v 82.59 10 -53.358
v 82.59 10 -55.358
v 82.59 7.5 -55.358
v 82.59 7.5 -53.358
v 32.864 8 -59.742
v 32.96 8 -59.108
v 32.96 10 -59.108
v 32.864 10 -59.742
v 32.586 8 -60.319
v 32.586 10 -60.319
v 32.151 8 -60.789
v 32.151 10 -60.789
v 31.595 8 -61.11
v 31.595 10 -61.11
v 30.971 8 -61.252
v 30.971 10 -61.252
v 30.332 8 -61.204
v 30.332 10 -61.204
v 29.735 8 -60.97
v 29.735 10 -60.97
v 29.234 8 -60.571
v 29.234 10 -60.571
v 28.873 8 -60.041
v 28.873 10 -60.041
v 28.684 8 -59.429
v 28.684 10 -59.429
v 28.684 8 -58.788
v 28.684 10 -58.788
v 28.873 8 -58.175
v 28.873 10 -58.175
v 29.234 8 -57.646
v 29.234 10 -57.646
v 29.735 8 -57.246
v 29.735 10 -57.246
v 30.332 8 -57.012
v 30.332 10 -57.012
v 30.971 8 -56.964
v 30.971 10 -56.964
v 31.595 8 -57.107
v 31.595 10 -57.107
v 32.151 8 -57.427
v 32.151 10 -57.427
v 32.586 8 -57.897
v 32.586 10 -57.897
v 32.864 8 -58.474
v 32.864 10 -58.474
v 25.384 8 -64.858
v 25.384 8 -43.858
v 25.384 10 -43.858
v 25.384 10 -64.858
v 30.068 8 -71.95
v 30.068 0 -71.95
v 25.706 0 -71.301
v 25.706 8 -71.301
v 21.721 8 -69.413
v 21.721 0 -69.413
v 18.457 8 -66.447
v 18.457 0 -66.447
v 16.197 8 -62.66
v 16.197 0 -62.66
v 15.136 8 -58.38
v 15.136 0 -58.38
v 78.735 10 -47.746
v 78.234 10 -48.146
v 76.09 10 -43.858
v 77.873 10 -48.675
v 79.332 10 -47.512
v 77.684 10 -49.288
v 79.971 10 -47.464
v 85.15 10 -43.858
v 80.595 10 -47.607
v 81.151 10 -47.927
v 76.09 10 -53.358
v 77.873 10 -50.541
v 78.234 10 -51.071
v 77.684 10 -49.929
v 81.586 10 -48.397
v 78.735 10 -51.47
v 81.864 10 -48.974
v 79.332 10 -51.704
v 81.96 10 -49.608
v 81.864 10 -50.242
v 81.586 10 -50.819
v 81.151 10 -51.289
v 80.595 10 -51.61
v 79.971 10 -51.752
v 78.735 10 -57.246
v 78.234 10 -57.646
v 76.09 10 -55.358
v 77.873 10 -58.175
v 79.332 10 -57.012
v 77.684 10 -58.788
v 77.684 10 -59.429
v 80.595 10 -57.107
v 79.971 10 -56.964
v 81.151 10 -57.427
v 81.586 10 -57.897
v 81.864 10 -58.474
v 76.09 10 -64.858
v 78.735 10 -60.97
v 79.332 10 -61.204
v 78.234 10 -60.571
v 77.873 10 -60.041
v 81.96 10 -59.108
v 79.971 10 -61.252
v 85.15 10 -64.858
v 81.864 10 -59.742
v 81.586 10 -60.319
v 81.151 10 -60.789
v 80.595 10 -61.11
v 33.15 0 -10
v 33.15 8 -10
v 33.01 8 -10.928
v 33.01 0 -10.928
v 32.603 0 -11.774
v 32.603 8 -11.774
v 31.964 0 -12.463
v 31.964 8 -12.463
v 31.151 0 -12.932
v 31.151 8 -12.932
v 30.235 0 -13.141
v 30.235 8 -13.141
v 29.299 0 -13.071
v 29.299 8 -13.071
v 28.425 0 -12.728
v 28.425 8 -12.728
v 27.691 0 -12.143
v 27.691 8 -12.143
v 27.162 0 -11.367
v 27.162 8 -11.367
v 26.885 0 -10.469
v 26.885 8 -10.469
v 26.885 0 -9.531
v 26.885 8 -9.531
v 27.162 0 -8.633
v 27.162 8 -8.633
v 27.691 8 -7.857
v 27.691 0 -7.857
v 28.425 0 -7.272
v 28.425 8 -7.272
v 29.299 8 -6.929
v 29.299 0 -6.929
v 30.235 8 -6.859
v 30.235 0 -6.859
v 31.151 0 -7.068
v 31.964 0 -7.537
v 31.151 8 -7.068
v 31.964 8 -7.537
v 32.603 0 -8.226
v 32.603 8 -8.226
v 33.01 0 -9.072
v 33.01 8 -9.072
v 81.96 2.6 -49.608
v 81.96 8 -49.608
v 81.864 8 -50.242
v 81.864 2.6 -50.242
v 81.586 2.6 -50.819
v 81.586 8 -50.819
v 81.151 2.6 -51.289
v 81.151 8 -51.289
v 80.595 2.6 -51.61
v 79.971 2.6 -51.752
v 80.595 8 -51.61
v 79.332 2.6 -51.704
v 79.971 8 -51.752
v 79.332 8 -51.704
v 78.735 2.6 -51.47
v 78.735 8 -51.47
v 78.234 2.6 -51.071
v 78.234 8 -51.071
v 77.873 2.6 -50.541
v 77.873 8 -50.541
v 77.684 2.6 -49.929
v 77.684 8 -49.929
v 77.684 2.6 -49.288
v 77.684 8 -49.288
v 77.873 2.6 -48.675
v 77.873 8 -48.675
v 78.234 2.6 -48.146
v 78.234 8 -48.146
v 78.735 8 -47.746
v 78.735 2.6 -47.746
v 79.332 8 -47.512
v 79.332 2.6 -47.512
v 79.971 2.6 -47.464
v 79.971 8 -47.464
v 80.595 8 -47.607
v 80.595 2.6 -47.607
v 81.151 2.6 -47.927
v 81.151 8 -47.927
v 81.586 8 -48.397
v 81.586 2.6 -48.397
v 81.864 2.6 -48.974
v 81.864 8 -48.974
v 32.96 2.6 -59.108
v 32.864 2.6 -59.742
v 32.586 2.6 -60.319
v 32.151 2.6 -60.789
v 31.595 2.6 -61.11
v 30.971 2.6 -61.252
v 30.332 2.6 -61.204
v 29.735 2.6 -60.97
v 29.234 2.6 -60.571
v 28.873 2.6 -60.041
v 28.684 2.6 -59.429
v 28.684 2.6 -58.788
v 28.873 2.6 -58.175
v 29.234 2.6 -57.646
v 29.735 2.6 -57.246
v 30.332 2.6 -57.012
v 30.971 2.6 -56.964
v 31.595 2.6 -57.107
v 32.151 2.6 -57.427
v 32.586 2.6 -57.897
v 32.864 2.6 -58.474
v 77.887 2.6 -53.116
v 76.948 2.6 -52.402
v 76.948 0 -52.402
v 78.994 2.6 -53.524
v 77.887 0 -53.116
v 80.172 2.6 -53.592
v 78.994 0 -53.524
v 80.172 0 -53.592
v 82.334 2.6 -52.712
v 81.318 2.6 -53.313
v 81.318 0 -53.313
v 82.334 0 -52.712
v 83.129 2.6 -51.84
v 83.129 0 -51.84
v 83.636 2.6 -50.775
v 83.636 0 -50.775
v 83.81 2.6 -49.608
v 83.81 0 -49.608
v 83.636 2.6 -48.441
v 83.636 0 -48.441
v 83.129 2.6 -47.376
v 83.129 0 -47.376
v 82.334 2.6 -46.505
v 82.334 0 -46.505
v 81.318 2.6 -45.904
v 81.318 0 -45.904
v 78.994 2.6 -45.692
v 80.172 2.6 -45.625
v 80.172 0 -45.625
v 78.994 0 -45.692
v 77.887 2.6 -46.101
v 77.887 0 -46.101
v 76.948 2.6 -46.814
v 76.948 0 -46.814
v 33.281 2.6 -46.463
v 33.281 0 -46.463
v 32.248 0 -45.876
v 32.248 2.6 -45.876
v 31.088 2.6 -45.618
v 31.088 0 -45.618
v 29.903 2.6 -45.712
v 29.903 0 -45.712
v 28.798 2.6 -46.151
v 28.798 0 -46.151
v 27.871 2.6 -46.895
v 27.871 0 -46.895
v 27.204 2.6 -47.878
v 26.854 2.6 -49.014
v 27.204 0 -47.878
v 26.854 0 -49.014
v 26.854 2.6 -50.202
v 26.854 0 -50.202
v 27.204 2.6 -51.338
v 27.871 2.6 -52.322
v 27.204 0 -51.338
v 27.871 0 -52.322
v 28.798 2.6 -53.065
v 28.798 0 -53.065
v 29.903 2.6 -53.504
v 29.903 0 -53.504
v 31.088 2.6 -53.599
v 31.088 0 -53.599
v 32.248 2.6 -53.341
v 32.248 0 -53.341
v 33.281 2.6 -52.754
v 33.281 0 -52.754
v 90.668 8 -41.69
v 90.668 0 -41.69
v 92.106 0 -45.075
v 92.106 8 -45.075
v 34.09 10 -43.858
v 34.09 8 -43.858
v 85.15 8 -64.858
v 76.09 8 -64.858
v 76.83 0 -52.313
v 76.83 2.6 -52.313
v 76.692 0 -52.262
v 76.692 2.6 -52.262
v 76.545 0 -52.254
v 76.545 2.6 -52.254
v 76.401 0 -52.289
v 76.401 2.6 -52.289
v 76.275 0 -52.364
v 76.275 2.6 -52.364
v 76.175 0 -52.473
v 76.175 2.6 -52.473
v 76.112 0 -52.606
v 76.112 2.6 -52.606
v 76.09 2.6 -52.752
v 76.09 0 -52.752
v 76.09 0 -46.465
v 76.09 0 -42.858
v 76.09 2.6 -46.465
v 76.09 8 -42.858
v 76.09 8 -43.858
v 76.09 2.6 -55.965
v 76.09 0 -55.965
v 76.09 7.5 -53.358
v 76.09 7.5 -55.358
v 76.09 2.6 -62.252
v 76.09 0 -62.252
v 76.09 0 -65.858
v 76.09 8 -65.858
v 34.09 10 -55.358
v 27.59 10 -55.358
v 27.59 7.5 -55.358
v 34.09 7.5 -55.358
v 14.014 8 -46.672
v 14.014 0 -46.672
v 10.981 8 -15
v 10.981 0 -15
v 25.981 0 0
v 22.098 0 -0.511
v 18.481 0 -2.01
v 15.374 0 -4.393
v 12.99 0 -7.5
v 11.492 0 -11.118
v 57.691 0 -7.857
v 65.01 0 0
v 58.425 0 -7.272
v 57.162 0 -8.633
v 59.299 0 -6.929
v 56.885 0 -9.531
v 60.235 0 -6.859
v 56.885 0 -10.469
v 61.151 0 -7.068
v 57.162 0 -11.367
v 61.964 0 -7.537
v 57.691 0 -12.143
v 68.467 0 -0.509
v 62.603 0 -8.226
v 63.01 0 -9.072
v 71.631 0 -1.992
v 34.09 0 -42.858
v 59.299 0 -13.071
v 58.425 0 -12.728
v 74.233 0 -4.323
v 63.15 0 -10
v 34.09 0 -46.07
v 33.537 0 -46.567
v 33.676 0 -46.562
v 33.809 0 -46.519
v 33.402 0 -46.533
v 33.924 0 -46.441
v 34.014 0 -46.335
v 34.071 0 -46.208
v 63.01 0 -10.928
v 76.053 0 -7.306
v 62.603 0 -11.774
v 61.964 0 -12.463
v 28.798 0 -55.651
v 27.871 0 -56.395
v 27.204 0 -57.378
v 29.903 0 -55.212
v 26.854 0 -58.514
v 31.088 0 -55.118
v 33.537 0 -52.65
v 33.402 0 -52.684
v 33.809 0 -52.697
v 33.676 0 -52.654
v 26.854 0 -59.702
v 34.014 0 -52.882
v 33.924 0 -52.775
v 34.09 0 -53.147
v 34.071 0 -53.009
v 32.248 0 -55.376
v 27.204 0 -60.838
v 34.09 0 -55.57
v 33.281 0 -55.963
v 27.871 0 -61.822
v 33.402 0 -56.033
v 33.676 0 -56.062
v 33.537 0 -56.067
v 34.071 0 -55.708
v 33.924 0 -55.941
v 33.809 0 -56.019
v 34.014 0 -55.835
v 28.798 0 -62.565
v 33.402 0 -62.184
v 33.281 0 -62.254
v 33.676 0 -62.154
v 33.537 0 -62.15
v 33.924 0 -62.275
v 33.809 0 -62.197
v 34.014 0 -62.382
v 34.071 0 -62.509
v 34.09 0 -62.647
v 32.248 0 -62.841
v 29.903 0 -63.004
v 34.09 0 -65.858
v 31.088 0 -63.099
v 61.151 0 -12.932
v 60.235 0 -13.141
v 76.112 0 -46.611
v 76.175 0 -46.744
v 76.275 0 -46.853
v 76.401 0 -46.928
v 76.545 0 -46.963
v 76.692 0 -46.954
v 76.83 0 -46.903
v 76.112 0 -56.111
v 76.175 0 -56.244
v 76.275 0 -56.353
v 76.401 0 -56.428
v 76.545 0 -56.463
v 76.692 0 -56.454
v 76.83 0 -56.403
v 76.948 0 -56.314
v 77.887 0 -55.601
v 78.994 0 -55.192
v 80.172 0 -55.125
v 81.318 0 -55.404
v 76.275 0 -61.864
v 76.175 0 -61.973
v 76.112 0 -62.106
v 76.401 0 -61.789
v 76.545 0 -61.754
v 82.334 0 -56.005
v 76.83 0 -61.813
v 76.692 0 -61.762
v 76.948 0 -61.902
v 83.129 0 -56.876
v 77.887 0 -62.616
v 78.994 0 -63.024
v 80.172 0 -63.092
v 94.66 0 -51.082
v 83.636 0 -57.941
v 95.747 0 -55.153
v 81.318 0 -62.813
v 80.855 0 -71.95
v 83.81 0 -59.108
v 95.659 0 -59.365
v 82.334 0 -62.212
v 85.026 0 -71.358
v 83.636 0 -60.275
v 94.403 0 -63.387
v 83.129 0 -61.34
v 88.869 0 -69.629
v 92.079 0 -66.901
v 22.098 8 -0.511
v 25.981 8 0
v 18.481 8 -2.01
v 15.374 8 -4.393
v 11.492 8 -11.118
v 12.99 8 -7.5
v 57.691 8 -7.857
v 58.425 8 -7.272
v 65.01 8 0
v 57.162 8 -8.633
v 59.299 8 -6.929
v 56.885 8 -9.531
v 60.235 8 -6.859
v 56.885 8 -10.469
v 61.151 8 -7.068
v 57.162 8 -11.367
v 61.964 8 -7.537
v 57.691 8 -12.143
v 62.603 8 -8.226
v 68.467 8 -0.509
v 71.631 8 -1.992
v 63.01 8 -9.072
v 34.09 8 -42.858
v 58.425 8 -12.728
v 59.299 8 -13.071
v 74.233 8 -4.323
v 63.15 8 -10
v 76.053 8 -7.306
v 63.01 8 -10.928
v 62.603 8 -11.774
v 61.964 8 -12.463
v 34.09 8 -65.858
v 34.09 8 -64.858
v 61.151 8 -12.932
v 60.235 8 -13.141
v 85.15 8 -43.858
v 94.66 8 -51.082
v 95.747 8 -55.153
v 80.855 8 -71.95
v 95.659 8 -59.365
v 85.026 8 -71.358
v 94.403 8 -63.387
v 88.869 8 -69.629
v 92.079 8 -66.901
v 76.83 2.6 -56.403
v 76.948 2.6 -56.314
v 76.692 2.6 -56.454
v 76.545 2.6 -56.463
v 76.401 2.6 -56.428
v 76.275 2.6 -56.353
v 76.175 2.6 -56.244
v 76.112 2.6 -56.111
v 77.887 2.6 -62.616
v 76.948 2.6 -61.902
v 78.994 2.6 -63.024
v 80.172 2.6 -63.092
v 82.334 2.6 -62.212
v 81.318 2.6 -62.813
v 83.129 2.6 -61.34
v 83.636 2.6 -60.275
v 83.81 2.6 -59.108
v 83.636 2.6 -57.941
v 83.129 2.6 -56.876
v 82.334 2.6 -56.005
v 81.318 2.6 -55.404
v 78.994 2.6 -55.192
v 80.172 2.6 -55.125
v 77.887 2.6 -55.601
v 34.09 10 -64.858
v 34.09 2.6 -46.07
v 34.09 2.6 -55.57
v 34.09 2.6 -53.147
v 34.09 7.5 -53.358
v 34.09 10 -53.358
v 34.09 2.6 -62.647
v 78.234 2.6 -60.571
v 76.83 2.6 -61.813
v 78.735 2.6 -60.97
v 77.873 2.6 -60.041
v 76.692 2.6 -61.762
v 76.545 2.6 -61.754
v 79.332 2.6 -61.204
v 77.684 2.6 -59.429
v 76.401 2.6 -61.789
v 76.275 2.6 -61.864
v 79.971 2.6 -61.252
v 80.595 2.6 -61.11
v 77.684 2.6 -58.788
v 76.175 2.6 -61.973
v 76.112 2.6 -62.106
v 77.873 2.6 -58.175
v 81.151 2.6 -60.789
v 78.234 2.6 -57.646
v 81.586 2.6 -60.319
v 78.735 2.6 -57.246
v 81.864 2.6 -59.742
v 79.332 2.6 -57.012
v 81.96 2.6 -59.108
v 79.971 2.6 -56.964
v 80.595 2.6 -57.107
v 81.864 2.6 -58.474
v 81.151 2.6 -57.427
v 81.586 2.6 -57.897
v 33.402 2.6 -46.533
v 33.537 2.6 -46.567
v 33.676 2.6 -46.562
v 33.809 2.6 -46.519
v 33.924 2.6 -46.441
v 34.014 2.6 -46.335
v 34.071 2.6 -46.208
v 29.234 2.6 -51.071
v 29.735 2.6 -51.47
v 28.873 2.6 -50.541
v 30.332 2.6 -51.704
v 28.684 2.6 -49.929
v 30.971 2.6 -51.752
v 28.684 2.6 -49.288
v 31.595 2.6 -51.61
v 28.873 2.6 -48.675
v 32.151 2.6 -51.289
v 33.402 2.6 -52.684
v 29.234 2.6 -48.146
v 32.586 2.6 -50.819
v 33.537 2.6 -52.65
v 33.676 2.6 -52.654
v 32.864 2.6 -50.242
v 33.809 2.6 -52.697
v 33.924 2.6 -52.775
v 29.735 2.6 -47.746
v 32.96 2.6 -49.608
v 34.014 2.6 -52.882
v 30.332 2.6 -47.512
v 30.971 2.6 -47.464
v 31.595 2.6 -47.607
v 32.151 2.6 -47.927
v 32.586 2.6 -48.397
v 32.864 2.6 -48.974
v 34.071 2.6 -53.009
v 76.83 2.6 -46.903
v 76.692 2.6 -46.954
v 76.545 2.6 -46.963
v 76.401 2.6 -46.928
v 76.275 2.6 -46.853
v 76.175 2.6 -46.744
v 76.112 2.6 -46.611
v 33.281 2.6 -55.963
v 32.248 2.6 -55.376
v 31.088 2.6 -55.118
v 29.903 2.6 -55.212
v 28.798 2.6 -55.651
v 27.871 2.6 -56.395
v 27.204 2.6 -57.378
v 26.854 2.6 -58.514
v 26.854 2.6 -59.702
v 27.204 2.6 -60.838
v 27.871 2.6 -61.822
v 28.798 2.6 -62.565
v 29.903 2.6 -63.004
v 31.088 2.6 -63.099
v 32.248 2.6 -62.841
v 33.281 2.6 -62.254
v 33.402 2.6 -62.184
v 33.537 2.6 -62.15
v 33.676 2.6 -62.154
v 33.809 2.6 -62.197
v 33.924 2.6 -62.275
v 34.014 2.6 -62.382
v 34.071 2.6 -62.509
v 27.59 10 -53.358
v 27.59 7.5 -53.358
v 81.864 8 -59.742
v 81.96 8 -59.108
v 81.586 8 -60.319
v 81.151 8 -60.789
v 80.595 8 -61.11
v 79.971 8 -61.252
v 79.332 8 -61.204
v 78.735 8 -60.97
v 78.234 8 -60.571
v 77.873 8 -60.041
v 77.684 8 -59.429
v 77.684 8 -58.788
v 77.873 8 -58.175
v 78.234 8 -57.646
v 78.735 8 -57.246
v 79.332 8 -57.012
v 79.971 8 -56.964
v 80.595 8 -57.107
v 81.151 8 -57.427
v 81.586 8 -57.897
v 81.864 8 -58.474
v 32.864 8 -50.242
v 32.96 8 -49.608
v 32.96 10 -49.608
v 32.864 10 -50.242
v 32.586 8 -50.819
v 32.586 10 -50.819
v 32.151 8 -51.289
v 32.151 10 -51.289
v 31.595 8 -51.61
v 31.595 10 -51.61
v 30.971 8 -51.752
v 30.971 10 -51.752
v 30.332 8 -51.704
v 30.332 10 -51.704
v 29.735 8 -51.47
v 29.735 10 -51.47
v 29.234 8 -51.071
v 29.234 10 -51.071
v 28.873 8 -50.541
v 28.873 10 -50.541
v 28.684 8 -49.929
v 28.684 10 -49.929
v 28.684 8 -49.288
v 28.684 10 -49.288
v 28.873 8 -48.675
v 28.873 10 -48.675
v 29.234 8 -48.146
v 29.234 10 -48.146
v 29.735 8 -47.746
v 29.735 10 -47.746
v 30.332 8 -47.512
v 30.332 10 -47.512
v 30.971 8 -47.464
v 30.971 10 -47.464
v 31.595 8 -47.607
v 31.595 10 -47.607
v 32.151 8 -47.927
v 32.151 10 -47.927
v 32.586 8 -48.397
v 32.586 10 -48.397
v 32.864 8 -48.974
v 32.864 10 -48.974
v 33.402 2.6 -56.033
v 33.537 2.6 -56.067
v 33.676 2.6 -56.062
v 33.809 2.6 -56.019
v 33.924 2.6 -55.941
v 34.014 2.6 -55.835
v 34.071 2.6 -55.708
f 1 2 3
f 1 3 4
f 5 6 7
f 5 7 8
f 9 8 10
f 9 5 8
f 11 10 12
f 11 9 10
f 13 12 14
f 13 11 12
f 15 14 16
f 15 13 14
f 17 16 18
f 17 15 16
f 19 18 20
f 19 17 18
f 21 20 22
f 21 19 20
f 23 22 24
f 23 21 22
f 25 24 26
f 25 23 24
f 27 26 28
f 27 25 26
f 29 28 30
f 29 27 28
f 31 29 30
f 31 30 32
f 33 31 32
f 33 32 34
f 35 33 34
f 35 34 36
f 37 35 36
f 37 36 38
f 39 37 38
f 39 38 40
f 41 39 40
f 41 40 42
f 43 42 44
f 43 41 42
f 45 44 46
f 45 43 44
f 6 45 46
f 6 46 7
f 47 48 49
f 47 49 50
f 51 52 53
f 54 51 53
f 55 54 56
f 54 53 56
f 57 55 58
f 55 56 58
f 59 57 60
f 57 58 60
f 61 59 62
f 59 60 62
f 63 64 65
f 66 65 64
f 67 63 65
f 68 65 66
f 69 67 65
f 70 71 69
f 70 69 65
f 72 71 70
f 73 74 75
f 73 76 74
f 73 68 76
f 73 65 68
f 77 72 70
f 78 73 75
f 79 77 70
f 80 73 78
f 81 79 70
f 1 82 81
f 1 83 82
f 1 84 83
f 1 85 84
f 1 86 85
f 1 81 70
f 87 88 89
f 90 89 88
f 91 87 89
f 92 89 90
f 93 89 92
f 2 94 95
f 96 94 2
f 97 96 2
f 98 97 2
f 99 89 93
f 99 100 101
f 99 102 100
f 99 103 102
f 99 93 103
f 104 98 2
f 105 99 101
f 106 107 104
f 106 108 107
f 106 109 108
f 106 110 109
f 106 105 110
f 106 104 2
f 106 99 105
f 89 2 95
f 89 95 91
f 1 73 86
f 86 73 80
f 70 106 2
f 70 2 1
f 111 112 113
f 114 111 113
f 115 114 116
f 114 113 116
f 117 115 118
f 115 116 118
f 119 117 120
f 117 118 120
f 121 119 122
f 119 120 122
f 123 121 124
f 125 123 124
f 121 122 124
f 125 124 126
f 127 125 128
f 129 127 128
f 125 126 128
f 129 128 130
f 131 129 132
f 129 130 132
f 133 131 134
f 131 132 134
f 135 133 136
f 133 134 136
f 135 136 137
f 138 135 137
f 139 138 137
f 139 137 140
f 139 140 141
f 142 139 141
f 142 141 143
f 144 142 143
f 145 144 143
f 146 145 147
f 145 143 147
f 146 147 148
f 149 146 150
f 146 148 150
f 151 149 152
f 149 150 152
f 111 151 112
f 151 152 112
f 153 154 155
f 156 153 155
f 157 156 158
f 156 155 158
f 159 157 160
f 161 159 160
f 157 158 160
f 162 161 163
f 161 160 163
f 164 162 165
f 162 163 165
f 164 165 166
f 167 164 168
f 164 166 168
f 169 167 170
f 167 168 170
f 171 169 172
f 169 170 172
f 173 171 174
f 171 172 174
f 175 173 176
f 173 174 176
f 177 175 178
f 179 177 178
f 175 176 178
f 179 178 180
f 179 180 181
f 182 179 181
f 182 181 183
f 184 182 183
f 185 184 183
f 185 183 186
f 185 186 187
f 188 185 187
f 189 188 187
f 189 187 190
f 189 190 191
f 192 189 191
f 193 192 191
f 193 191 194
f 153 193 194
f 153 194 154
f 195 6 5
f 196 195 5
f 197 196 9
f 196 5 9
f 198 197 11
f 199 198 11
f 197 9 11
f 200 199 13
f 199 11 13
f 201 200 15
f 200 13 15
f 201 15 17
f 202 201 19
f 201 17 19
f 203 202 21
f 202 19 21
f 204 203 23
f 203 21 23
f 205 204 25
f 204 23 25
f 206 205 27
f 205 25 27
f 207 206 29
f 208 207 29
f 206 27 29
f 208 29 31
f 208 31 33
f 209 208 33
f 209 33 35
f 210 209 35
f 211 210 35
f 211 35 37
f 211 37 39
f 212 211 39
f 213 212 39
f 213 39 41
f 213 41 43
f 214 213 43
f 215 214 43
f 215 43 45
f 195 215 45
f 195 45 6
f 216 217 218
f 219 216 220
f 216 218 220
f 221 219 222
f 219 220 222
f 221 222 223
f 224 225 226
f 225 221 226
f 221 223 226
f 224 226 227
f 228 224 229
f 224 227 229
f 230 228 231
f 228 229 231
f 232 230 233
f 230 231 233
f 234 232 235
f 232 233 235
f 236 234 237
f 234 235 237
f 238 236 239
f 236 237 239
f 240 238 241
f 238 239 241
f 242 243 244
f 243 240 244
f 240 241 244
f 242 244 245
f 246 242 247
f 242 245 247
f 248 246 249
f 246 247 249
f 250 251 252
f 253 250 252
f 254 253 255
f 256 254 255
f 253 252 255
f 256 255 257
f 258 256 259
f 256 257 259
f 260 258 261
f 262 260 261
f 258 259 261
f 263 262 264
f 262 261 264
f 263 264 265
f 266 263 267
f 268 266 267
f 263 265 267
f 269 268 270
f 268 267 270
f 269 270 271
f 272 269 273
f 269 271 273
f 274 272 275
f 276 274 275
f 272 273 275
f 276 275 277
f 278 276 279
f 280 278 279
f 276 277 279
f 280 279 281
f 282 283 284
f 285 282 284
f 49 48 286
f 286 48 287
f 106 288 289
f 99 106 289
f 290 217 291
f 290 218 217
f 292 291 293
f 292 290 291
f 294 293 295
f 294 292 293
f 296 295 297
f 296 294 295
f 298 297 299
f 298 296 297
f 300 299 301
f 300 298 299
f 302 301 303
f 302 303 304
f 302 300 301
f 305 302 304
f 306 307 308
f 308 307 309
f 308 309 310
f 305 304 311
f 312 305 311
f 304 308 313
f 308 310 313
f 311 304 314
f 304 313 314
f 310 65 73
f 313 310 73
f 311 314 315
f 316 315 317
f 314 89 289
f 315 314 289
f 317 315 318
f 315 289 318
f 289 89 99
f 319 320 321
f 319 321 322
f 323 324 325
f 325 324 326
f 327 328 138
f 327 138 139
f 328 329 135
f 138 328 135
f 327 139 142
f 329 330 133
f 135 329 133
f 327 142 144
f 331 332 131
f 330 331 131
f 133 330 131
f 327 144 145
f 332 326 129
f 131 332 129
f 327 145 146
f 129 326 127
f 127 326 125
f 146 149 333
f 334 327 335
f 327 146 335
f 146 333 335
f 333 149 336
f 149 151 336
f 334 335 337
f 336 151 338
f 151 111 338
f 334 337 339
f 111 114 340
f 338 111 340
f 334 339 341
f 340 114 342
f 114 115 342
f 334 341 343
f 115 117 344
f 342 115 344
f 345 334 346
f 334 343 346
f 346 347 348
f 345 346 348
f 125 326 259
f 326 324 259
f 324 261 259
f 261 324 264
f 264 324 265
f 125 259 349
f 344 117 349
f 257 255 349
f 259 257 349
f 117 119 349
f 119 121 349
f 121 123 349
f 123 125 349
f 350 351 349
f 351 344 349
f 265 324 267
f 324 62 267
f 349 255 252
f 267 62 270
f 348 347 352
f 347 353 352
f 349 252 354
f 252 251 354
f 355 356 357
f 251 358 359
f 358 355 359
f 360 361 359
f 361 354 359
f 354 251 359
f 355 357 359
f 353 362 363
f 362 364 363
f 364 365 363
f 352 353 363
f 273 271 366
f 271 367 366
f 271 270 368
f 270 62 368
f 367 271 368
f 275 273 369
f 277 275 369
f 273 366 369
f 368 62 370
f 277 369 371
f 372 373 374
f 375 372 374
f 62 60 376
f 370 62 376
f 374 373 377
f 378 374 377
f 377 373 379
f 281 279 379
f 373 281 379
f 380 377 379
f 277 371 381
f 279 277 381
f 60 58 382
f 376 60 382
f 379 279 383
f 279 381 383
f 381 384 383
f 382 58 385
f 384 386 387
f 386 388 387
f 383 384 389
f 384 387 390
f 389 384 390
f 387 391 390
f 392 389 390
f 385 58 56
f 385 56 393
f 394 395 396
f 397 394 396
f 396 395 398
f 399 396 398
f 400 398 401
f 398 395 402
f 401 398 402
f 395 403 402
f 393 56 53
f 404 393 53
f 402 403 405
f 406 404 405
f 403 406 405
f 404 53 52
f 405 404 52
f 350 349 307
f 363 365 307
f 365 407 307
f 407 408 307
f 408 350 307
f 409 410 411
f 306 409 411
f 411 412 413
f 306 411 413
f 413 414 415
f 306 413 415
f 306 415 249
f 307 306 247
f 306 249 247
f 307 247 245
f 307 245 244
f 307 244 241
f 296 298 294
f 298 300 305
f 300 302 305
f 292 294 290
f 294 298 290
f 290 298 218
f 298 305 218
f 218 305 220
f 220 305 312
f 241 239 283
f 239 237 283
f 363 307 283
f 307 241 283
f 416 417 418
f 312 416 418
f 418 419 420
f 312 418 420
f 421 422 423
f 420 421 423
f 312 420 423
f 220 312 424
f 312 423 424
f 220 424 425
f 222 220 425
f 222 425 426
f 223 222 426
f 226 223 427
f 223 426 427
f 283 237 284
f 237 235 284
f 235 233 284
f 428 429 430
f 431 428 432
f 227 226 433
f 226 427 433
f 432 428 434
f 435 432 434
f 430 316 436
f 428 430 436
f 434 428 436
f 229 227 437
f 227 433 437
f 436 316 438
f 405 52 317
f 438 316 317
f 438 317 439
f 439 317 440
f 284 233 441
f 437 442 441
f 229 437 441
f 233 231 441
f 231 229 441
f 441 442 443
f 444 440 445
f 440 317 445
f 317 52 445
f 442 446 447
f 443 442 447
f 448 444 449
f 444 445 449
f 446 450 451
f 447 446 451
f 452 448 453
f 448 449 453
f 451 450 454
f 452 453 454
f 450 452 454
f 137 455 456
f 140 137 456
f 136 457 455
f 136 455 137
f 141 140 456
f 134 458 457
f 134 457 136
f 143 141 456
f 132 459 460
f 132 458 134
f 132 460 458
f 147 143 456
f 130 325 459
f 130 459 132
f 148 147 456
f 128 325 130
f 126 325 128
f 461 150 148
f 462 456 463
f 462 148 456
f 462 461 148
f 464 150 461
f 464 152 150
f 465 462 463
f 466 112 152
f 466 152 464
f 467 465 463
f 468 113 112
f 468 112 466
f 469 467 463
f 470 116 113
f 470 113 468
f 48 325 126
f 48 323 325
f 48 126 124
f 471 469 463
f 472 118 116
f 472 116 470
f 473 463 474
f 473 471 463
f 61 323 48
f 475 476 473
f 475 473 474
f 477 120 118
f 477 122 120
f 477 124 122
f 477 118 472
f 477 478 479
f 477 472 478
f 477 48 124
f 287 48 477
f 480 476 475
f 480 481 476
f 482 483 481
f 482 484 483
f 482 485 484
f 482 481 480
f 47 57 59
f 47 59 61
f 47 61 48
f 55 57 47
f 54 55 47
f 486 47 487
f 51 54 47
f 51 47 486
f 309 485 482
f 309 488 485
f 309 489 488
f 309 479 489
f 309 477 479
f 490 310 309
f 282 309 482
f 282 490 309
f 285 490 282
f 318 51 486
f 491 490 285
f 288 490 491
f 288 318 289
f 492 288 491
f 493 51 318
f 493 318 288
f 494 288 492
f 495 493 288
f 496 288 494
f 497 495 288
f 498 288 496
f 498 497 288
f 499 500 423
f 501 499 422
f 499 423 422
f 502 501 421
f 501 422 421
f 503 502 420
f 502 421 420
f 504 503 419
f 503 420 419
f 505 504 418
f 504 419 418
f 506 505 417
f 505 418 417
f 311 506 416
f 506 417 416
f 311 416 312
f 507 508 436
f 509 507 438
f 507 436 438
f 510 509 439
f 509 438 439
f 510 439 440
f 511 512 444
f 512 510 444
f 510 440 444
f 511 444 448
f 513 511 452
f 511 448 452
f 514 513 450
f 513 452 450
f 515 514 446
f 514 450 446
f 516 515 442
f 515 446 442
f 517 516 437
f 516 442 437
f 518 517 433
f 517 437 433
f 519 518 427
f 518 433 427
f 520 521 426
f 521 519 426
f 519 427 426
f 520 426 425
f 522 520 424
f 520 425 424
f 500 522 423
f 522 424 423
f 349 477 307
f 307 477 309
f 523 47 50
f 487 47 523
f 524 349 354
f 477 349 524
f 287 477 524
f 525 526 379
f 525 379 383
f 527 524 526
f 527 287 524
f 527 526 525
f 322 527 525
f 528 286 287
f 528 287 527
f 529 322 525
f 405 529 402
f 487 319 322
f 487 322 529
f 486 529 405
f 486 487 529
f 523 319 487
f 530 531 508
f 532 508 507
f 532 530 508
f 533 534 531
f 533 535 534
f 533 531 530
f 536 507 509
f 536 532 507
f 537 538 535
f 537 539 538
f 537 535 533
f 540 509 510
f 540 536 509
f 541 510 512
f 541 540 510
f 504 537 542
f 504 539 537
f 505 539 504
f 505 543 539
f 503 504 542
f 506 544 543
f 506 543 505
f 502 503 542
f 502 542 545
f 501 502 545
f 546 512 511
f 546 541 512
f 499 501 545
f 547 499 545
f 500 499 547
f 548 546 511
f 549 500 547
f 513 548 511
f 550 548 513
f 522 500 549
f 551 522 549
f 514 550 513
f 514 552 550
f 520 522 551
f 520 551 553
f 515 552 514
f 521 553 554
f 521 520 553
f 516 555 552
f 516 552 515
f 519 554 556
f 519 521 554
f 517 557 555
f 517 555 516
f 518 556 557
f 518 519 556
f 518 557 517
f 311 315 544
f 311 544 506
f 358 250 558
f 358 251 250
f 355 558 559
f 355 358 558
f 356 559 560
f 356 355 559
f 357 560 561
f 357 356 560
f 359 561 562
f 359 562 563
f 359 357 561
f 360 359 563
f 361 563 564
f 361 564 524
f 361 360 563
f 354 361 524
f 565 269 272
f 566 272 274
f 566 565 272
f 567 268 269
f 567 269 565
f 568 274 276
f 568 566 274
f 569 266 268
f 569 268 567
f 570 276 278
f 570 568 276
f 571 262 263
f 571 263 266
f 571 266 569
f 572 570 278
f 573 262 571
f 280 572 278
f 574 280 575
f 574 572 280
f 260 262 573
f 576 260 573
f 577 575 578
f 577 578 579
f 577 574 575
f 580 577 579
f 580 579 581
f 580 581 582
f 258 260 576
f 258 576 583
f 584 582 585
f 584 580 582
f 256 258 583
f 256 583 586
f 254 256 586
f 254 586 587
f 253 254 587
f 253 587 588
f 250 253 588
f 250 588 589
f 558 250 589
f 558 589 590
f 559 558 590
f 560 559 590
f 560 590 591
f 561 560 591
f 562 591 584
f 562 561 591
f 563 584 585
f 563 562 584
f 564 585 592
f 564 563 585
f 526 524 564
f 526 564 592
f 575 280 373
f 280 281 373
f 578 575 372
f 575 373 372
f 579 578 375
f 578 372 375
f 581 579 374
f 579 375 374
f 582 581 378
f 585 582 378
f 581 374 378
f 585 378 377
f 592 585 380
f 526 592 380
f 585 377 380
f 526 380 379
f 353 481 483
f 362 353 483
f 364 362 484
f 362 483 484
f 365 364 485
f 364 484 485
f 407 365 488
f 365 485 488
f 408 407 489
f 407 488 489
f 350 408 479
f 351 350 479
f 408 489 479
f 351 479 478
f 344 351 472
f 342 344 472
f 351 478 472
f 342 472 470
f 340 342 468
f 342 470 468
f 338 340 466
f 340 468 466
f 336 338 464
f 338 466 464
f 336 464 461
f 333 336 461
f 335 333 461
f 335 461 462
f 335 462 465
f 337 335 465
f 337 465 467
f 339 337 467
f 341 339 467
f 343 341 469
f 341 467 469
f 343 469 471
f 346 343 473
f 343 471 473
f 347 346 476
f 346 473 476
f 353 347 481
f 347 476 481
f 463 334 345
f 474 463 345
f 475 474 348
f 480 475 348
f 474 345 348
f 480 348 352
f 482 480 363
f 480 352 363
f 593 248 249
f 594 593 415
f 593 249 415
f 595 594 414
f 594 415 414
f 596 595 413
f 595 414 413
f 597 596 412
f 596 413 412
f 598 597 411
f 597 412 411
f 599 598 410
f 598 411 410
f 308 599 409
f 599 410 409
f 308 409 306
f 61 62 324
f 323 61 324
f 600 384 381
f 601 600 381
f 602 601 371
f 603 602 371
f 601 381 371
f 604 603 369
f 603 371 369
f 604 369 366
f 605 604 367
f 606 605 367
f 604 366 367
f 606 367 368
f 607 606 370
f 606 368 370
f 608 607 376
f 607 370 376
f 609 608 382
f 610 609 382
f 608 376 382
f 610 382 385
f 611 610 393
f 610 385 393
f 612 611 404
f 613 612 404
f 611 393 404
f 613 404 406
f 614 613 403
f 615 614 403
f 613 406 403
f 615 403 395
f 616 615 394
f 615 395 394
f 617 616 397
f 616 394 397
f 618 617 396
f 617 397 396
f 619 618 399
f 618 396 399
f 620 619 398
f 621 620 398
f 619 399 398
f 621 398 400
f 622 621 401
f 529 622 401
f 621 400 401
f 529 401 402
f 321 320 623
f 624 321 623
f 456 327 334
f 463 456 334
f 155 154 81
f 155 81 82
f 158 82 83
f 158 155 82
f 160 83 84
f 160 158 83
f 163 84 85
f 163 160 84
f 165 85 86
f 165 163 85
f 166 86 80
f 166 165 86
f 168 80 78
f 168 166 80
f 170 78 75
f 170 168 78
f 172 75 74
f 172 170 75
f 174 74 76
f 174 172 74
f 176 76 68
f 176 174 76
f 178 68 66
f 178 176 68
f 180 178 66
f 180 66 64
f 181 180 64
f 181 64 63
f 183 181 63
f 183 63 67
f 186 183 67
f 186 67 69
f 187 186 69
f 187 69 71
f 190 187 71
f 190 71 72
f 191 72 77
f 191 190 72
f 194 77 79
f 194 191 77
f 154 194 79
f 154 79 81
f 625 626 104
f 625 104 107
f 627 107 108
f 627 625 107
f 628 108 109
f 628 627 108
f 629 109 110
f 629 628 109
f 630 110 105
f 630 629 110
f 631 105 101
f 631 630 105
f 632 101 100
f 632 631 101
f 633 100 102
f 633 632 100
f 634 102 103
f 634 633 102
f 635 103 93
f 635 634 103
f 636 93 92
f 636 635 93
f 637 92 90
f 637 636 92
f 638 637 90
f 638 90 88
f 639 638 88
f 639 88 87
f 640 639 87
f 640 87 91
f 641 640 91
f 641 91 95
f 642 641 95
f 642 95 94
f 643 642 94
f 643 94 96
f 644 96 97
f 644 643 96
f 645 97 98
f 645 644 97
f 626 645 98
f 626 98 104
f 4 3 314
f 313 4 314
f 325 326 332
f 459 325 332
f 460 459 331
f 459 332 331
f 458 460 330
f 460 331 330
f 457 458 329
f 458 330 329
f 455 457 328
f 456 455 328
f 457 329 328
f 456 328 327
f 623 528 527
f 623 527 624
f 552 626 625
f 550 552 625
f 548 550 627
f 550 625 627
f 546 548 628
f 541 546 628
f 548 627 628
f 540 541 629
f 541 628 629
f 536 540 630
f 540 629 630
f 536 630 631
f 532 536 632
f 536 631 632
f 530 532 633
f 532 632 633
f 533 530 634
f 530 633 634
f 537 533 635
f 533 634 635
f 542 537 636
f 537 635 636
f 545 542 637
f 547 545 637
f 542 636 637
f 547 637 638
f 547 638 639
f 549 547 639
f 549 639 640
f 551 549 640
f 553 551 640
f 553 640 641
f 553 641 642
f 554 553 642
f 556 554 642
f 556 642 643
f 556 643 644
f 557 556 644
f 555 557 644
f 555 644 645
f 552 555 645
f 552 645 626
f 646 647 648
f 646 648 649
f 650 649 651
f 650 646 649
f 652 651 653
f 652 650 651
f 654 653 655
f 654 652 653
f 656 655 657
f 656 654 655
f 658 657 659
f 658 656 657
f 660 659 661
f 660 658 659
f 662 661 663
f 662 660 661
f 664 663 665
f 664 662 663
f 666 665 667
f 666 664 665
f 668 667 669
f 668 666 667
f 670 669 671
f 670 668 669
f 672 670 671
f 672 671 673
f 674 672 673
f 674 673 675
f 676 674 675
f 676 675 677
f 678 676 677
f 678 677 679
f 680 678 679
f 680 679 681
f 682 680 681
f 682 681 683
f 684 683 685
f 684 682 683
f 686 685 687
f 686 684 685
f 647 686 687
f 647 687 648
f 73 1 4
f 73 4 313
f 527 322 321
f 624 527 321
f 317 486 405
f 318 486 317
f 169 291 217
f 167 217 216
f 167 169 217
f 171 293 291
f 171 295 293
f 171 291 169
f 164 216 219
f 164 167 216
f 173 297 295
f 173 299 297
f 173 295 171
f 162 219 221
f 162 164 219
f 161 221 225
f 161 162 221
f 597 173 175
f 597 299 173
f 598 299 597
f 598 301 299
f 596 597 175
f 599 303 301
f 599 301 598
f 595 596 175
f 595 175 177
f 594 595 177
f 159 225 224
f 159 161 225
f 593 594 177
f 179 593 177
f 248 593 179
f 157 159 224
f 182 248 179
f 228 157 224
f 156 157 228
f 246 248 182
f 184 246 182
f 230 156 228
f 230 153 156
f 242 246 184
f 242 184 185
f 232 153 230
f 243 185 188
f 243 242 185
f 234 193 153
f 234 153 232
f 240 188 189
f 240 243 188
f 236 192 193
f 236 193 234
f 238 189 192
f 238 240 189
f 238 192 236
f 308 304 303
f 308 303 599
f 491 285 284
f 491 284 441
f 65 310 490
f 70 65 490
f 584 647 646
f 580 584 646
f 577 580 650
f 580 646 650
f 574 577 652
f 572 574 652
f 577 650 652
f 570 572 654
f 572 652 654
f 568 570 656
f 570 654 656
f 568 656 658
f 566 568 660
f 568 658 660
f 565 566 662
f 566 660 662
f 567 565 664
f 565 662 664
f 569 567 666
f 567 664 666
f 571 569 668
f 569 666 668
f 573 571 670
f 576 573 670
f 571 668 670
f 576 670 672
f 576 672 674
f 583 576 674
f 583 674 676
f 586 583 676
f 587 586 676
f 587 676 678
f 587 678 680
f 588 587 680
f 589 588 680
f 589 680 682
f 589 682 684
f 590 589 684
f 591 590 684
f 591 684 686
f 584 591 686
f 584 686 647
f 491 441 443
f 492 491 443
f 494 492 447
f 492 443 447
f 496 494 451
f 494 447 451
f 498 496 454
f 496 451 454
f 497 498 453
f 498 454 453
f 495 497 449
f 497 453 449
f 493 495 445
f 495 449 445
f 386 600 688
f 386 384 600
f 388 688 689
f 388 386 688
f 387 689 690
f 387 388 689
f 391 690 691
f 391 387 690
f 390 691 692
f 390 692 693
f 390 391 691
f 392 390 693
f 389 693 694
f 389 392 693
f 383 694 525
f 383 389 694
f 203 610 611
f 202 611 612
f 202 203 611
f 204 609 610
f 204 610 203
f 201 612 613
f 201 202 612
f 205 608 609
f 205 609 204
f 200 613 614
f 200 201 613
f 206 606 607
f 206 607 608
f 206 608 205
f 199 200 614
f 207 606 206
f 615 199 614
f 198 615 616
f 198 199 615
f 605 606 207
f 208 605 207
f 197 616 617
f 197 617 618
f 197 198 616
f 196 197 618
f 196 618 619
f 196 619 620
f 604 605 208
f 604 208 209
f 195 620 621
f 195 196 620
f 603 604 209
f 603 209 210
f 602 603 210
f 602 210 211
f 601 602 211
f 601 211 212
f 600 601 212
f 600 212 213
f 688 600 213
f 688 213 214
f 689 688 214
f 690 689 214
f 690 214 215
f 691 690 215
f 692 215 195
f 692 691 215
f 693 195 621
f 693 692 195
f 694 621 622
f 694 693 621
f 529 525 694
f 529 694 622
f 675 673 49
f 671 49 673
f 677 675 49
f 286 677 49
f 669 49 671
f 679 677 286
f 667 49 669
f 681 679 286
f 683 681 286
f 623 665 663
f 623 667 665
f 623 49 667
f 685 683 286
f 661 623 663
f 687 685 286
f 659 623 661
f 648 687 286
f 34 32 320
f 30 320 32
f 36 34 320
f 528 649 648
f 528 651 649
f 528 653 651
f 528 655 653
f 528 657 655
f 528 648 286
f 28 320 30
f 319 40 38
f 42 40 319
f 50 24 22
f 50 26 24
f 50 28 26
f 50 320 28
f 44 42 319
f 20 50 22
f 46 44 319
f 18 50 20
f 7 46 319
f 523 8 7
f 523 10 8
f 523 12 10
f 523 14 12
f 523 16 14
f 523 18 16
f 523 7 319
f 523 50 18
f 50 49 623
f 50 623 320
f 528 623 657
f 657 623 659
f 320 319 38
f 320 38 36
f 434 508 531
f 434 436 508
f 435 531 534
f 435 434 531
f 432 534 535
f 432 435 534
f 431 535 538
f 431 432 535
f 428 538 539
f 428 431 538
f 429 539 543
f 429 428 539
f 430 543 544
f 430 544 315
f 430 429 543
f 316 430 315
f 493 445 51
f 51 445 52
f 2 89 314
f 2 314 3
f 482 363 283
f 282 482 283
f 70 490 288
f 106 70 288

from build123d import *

# Parameters (mm, degrees)
BOSS_EXTRUDE1_DEPTH     = 8
SKETCH2_R               = 3.15
CUT_EXTRUDE1_DEPTH      = 8
SKETCH3_W               = 9.706264803
SKETCH3_H               = 21
SKETCH3_R               = 2.15
BOSS_EXTRUDE3_DEPTH     = 2
SKETCH4_W               = 42
SKETCH4_H               = 23
CUT_EXTRUDE4_DEPTH      = 16
CUT_EXTRUDE4_DEPTH_BACK = 16
CUT_EXTRUDE5_DEPTH      = 2.5
SKETCH8_R               = 2.15
CUT_EXTRUDE8_DEPTH      = 21.6
SKETCH9_R               = 4
CUT_EXTRUDE9_DEPTH      = 2.6
FILLET2_R               = 0.5


with BuildPart() as part:
    # Sketch1 → Boss-Extrude1 (new body)
    with BuildSketch(Plane(origin=(0, 0, 0), x_dir=(1, 0, 0), z_dir=(0, 1, 0))):
        with BuildLine():
            ThreePointArc((10.980762114, 15), (15.374160396, 4.393398282), (25.980762114, 0))
            Line((25.980762114, 0), (65.009618943, 0))
            ThreePointArc((65.009618943, 0), (71.630509288, 1.991812799), (76.05347061, 7.306031492))
            Line((76.05347061, 7.306031492), (90.667824887, 41.690318597))
            Line((90.667824887, 41.690318597), (92.106342015, 45.074825706))
            Line((92.106342015, 45.074825706), (94.659597169, 51.082060554))
            ThreePointArc((94.659597169, 51.082060554), (93.365016587, 65.225634119), (80.854782585, 71.949521188))
            Line((80.854782585, 71.949521188), (30.067550518, 71.949521188))
            ThreePointArc((30.067550518, 71.949521188), (19.979275987, 68.05027418), (15.13589136, 58.37975012))
            Line((15.13589136, 58.37975012), (14.014444666, 46.671792448))
            Line((14.014444666, 46.671792448), (10.980762114, 15))
        make_face()
    extrude(amount=BOSS_EXTRUDE1_DEPTH)

    # Sketch2 → Cut-Extrude1 (cut)
    with BuildSketch(Plane(origin=(0, 8, 0), x_dir=(1, 0, 0), z_dir=(0, 1, 0))):
        with Locations((30, 10)):
            Circle(SKETCH2_R)
        with Locations((60, 10)):
            Circle(SKETCH2_R)
    extrude(amount=-CUT_EXTRUDE1_DEPTH, mode=Mode.SUBTRACT)

    # Sketch3 → Boss-Extrude3 (add)
    with BuildSketch(Plane(origin=(0, 8, 0), x_dir=(1, 0, 0), z_dir=(0, 1, 0))):
        with Locations((30.236867599, 54.358166274)):
            Rectangle(SKETCH3_W, SKETCH3_H)
        with Locations((30.81, 49.608166274)):
            Circle(SKETCH3_R, mode=Mode.SUBTRACT)
        with Locations((30.81, 59.108166274)):
            Circle(SKETCH3_R, mode=Mode.SUBTRACT)
        Polygon((75.15, 43.858166274), (85.15, 43.858166274), (85.15, 62.709957967), (85.15, 64.858166274), (75.15, 64.858166274), (75.11, 54.358166274), align=None)
        with Locations((79.81, 49.608166274)):
            Circle(SKETCH3_R, mode=Mode.SUBTRACT)
        with Locations((79.81, 59.108166274)):
            Circle(SKETCH3_R, mode=Mode.SUBTRACT)
    extrude(amount=BOSS_EXTRUDE3_DEPTH)

    # Sketch4 → Cut-Extrude4 (cut, two sides)
    with BuildSketch(Plane(origin=(0, 8, 0), x_dir=(1, 0, 0), z_dir=(0, 1, 0))) as cut_extrude4_sk:
        with Locations((55.09, 54.358166274)):
            Rectangle(SKETCH4_W, SKETCH4_H)
    extrude(amount=CUT_EXTRUDE4_DEPTH, mode=Mode.SUBTRACT)
    extrude(cut_extrude4_sk.sketch, amount=-CUT_EXTRUDE4_DEPTH_BACK, mode=Mode.SUBTRACT)

    # Sketch5 → Cut-Extrude5 (cut)
    with BuildSketch(Plane(origin=(0, 10, 0), x_dir=(1, 0, 0), z_dir=(0, 1, 0))):
        Polygon((76.09, 54.358166274), (76.09, 55.358166274), (82.59, 55.358166274), (82.59, 53.358166274), (76.09, 53.358166274), align=None)
        Polygon((27.59, 54.358166274), (27.59, 55.358166274), (34.09, 55.358166274), (34.09, 53.358166274), (27.59, 53.358166274), align=None)
    extrude(amount=-CUT_EXTRUDE5_DEPTH, mode=Mode.SUBTRACT)

    # Sketch8 → Cut-Extrude8 (cut)
    with BuildSketch(Plane(origin=(0, 8, 0), x_dir=(1, 0, 0), z_dir=(0, 1, 0))):
        with Locations((30.81, 49.608166274)):
            Circle(SKETCH8_R)
        with Locations((30.81, 59.108166274)):
            Circle(SKETCH8_R)
        with Locations((79.81, 59.108166274)):
            Circle(SKETCH8_R)
        with Locations((79.81, 49.608166274)):
            Circle(SKETCH8_R)
    extrude(amount=-CUT_EXTRUDE8_DEPTH, mode=Mode.SUBTRACT)

    # Sketch9 → Cut-Extrude9 (cut)
    with BuildSketch(Plane.XZ):
        with Locations((30.81, -59.108166274)):
            Circle(SKETCH9_R)
        with Locations((30.81, -49.608166274)):
            Circle(SKETCH9_R)
        with Locations((79.81, -59.108166274)):
            Circle(SKETCH9_R)
        with Locations((79.81, -49.608166274)):
            Circle(SKETCH9_R)
    extrude(amount=-CUT_EXTRUDE9_DEPTH, mode=Mode.SUBTRACT)

    # Fillet2
    fillet2_edges = [part.edges().sort_by_distance(p)[0] for p in [
        (76.09, 1.3, -51.07840435),
        (76.09, 1.3, -48.137928198),
        (76.09, 1.3, -60.57840435),
        (76.09, 1.3, -57.637928198),
        (34.09, 1.3, -56.818712191),
        (34.09, 1.3, -61.397620358),
        (34.09, 1.3, -47.318712191),
        (34.09, 1.3, -51.897620358),
    ]]
    fillet(fillet2_edges, radius=FILLET2_R)


solid = part.part
